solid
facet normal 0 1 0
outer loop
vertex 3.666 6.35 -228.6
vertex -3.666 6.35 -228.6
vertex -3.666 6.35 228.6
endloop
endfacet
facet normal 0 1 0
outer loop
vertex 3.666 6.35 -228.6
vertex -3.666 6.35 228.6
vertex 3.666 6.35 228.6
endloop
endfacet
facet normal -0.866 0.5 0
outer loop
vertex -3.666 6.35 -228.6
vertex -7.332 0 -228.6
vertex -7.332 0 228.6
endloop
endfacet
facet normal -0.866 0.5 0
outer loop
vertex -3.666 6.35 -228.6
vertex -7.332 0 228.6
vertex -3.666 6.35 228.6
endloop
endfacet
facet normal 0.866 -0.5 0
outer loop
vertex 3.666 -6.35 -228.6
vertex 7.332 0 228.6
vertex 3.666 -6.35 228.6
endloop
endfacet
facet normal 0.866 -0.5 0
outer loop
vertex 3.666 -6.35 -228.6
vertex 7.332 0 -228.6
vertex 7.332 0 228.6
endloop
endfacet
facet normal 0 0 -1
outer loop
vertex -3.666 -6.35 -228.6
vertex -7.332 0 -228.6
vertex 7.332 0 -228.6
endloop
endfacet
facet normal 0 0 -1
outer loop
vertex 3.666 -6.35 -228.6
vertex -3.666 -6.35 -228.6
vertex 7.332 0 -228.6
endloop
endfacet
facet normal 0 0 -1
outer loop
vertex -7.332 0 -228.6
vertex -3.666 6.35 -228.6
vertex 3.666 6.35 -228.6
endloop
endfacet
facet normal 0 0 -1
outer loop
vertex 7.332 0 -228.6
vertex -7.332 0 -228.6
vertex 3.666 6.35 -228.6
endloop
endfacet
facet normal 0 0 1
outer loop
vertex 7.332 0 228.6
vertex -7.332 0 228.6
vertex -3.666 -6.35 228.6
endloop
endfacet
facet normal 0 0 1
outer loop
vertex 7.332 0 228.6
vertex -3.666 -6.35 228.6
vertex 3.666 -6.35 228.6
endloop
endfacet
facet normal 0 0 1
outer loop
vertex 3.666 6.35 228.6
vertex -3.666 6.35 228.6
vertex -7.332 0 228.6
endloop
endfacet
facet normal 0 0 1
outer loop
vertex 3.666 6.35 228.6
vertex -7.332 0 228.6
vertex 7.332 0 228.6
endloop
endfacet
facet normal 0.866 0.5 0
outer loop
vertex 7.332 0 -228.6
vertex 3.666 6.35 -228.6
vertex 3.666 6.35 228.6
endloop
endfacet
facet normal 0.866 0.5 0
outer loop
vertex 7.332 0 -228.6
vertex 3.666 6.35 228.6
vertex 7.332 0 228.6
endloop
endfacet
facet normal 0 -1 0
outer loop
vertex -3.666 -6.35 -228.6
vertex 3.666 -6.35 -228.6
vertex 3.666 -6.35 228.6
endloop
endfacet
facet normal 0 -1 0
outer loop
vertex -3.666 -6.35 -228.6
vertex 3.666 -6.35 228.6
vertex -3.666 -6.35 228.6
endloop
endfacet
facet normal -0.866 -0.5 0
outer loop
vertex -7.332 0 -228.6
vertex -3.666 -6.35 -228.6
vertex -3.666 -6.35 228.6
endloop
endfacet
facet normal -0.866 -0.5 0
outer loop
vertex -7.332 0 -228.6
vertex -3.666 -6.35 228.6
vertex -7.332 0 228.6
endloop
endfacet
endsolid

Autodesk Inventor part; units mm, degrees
ref_plane "YZ Plane" through (0, 0, 0) normal (1, 0, 0) x (0, 1, 0)
ref_plane "XZ Plane" through (0, 0, 0) normal (0, 1, 0) x (-1, 0, 0)
sketch "Sketch1" plane through (0, 0, 0) normal (0, 0, 1) x (1, 0, 0)
  line L0 (7.3323, 0) -> (3.6662, -6.35)
  line L1 (3.6662, -6.35) -> (-3.6662, -6.35)
  line L2 (-3.6662, -6.35) -> (-7.3323, 0)
  line L3 (-7.3323, 0) -> (-3.6662, 6.35)
  line L4 (-3.6662, 6.35) -> (3.6662, 6.35)
  line L5 (3.6662, 6.35) -> (7.3323, 0)
  point P0 (0, 0)
  point P1 (0, 0)
  dimension "d0" = 12.7
extrude "Extrusion1" add sketch "Sketch1" along normal mid plane 457.2
properties part number "hexExtrusion"
